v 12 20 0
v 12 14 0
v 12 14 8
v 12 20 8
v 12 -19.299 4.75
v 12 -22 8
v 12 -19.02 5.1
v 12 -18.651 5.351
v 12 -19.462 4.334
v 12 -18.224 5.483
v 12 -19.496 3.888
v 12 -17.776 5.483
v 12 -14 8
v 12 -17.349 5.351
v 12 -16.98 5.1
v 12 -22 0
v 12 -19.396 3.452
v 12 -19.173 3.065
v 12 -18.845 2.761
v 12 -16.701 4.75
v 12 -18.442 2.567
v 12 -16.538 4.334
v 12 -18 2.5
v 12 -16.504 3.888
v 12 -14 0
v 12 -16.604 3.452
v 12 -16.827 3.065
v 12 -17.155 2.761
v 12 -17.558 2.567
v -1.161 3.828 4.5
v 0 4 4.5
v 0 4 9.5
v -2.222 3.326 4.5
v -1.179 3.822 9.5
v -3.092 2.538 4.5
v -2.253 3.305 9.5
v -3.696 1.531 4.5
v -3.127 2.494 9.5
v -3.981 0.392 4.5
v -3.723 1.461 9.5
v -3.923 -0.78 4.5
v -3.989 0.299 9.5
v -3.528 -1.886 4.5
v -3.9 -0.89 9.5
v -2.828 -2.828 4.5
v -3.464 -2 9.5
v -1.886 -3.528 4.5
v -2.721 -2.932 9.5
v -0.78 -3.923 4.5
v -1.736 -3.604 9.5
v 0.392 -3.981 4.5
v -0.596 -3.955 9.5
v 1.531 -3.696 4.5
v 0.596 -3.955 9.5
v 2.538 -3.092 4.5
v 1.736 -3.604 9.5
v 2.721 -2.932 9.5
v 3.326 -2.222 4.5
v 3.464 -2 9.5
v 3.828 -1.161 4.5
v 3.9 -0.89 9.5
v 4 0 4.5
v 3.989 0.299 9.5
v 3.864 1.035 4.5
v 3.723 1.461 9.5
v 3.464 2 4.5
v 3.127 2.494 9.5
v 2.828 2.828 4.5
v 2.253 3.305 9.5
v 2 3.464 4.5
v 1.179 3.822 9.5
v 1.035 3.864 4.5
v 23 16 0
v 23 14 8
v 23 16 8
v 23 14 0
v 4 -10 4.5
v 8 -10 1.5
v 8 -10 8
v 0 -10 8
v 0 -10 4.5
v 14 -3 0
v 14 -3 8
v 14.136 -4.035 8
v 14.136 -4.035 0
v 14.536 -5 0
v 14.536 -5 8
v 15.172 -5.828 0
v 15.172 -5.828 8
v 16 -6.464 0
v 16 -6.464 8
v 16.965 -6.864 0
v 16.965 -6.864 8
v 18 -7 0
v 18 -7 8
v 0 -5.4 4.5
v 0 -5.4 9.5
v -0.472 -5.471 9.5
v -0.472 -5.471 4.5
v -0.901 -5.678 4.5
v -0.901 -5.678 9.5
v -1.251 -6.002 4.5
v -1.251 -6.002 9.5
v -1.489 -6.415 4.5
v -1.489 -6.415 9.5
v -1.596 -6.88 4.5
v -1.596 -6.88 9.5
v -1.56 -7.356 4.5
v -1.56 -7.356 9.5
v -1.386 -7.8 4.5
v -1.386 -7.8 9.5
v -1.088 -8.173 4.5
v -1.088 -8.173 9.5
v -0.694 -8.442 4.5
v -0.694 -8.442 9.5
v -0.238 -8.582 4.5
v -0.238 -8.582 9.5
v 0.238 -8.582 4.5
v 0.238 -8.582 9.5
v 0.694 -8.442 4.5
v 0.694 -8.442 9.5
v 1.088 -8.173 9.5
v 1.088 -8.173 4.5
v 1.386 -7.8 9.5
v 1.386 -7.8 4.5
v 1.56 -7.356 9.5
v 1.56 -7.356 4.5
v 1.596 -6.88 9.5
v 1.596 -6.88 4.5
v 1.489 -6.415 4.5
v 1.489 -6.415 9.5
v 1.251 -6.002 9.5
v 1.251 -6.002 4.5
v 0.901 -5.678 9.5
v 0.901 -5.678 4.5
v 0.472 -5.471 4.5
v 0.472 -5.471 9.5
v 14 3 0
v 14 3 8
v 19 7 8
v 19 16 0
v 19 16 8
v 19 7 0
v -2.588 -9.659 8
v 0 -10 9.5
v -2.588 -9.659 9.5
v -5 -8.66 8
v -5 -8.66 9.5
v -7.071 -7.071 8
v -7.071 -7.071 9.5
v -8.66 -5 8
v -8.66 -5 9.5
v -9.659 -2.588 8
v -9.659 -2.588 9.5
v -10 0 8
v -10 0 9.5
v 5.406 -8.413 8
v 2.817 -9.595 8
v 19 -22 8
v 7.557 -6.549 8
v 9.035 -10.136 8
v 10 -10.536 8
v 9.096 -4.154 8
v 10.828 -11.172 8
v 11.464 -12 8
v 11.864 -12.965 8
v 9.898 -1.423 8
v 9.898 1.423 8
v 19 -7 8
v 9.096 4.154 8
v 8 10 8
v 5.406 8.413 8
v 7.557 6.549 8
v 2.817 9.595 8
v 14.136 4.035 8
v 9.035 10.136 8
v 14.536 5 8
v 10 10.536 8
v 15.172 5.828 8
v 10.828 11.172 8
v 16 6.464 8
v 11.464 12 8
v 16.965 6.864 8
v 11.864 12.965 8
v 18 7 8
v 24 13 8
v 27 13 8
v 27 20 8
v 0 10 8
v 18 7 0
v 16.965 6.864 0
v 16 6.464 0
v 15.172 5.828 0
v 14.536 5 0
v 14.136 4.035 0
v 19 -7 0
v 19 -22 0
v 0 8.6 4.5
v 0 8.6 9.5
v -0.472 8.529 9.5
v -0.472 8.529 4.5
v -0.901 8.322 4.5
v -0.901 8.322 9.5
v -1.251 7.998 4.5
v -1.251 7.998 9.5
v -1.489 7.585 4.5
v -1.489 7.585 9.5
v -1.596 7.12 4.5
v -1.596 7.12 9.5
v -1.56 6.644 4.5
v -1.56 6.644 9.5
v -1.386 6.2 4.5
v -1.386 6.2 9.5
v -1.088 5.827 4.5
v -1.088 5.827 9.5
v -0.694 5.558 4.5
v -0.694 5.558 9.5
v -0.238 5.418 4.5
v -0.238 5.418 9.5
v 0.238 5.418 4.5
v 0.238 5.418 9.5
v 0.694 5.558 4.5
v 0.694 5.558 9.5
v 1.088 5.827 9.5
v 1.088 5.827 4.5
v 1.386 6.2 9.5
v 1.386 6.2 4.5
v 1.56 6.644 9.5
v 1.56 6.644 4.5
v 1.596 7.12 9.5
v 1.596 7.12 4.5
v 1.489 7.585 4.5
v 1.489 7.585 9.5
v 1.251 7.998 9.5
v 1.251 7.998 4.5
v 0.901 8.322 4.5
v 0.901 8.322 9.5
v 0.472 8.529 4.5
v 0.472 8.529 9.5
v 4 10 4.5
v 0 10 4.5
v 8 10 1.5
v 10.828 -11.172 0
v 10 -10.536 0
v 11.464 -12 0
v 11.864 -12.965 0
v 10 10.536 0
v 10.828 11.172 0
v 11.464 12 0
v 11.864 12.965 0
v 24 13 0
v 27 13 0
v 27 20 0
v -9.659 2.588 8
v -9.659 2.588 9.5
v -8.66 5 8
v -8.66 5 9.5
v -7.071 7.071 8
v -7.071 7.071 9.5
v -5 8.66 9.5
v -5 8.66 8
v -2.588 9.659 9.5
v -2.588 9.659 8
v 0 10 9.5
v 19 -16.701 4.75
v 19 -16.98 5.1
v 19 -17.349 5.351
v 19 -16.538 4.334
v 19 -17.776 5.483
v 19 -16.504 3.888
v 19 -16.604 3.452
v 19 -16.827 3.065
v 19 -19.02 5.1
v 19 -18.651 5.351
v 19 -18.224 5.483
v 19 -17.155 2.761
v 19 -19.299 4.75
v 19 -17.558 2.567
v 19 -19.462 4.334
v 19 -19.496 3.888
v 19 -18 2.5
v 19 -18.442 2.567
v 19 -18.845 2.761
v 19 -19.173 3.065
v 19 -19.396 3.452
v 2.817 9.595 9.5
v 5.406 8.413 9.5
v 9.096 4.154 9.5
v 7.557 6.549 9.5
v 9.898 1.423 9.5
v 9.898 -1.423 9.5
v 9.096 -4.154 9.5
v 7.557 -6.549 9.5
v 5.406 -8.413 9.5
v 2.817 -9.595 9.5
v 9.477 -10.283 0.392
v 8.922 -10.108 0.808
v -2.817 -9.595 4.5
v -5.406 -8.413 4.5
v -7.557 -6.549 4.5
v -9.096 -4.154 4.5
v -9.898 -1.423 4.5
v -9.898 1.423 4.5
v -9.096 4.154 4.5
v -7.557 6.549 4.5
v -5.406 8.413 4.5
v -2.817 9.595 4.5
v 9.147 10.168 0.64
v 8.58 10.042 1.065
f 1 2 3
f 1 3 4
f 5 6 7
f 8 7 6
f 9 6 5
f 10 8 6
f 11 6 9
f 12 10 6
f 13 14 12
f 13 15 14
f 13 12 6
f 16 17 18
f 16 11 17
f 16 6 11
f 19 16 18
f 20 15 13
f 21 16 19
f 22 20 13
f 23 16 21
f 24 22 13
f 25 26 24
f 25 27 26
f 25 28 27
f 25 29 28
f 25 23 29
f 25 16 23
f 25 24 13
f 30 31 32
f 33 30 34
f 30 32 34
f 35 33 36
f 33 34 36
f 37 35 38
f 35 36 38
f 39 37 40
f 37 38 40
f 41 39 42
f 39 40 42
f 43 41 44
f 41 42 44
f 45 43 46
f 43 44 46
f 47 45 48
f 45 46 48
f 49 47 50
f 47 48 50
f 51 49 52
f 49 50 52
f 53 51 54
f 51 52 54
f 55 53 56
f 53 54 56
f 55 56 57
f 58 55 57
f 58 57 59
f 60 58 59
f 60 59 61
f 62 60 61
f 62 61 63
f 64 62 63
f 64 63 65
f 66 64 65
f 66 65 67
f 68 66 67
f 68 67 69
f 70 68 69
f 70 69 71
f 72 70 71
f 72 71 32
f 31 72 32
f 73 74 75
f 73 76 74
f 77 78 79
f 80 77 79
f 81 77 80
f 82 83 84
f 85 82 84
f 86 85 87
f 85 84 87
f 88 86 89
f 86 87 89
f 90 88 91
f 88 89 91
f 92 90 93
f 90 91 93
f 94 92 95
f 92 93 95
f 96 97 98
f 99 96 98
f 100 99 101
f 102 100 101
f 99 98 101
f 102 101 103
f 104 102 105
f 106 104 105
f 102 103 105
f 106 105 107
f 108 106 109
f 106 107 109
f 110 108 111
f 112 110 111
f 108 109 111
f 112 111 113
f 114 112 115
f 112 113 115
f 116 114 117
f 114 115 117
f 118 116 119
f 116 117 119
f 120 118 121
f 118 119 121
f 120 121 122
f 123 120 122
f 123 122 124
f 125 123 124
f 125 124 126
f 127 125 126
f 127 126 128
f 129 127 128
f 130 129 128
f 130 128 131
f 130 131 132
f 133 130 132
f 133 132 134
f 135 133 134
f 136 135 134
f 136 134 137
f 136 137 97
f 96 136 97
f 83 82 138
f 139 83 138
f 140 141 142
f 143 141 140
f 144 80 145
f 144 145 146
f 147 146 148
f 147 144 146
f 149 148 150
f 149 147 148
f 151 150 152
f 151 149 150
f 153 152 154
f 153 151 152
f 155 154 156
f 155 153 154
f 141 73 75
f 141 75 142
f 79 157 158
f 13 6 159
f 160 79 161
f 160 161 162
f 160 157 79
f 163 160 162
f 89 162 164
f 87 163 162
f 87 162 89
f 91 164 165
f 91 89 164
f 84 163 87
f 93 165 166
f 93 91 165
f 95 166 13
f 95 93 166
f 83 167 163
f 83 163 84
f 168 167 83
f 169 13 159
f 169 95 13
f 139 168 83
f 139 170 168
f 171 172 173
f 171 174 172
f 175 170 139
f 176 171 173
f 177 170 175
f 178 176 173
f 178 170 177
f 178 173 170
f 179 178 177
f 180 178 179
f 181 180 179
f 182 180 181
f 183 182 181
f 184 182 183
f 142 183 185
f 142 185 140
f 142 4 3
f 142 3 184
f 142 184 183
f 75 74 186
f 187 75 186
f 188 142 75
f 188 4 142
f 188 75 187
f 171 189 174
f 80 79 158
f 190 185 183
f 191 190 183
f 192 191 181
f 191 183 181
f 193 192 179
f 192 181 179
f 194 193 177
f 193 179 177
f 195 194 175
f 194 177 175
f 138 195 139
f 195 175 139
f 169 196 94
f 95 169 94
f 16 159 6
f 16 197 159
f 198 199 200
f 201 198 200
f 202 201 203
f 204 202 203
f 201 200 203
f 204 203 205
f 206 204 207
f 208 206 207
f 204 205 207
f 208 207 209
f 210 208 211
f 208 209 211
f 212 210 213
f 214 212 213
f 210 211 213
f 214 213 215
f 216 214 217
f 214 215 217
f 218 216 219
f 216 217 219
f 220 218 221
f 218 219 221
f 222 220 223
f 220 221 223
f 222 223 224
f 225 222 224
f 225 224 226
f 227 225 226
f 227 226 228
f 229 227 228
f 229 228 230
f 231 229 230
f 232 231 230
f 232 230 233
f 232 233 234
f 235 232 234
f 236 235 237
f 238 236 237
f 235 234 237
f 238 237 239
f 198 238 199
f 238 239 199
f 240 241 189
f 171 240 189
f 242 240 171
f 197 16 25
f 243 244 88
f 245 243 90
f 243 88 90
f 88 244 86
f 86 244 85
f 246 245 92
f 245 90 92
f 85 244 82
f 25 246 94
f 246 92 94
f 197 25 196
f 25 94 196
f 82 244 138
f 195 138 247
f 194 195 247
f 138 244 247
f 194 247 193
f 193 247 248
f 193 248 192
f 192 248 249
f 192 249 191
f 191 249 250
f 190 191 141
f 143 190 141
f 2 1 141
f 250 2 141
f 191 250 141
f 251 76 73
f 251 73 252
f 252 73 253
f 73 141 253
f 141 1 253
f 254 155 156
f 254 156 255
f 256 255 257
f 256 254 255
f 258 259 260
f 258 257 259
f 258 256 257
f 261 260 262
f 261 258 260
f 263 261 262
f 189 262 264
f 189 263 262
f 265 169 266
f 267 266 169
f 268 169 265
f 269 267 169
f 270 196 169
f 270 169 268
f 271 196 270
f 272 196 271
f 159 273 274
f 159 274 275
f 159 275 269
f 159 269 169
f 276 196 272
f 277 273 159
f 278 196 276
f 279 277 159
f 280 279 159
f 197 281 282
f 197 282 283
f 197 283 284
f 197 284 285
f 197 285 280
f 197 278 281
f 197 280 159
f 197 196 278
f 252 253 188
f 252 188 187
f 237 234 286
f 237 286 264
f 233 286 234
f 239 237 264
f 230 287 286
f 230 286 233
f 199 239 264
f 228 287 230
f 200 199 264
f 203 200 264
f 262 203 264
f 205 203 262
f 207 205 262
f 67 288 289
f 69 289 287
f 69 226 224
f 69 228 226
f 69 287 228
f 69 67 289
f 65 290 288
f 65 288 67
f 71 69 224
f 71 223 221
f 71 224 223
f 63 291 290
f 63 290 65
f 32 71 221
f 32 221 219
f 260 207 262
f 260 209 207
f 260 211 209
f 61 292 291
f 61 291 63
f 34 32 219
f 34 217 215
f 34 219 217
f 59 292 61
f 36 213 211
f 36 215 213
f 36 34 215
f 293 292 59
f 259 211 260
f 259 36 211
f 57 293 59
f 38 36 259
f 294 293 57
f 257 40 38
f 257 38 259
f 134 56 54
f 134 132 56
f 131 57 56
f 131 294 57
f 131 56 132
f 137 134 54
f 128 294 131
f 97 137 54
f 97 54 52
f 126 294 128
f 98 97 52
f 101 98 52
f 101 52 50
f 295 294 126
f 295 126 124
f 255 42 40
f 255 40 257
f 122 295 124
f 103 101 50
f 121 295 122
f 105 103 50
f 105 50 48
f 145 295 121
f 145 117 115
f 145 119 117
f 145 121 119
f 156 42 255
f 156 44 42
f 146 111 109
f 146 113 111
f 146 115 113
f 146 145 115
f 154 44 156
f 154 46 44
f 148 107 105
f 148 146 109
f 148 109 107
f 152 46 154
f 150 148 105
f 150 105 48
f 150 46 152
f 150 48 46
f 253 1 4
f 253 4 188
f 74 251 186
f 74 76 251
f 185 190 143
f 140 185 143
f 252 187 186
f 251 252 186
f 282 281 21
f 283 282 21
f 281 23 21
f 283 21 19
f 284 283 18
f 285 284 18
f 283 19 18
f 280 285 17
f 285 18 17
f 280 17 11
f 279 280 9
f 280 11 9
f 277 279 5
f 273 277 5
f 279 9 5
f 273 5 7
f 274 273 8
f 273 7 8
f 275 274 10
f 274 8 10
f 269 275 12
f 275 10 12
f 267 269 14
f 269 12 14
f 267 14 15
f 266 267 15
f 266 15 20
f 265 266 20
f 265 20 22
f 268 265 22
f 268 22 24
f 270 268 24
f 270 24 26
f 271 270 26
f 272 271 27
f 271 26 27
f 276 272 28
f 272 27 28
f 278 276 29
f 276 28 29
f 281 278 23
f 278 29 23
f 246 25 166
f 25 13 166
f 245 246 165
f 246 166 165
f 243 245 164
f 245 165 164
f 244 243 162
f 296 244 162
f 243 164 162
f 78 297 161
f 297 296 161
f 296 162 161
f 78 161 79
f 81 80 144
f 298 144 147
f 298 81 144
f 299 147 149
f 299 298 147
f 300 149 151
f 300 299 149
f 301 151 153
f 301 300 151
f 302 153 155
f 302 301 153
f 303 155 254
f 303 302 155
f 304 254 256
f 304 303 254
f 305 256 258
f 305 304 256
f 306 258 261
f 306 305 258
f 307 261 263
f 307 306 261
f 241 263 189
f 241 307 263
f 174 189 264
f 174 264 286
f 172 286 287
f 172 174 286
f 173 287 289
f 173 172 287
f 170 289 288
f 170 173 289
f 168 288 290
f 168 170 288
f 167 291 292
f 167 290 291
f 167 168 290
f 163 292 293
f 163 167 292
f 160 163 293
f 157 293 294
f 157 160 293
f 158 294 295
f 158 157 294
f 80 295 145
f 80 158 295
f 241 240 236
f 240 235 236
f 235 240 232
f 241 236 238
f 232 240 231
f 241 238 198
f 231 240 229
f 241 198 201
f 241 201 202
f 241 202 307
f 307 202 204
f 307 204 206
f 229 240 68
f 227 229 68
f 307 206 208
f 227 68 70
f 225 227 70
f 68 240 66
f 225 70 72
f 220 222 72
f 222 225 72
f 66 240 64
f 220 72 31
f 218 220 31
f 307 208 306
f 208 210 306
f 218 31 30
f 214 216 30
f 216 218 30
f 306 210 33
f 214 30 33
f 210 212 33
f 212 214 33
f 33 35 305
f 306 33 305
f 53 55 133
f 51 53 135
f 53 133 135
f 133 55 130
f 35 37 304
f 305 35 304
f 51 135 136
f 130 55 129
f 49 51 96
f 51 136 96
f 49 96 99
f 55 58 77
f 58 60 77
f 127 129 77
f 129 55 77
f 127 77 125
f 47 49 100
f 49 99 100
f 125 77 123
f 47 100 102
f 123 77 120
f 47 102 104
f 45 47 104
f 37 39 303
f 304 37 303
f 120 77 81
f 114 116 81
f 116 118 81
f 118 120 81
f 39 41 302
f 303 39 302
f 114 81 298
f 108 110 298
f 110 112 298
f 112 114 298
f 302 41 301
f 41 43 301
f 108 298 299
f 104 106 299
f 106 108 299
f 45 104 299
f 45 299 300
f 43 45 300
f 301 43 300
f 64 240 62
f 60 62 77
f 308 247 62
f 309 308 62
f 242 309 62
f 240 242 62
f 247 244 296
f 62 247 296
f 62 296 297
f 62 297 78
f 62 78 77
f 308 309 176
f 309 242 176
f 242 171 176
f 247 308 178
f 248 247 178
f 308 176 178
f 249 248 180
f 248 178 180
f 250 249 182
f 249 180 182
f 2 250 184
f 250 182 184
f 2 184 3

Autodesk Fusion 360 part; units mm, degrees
sketch "スケッチ1" plane through (0, 0, 0) normal (0, 0, 1) x (1, 0, 0)
  circle A0 centre (0, 0) radius 10
  line L0 (0, 10) -> (12, 10)
  line L1 (12, 10) -> (12, 20)
  line L2 (12, 20) -> (27, 20)
  line L3 (27, 20) -> (27, 13)
  line L4 (27, 13) -> (23, 13)
  line L5 (23, 13) -> (23, 16)
  line L6 (23, 16) -> (19, 16)
  line L7 (19, 16) -> (19, -22)
  line L8 (19, -22) -> (12, -22)
  line L9 (12, -22) -> (12, -10)
  line L10 (12, -10) -> (0, -10)
  line L11 (0, -7) -> (0, 7)
  line L12 (19, -7) -> (14, -7)
  line L13 (14, -7) -> (14, 7)
  line L14 (14, 7) -> (19, 7)
  point P0 (14, 0)
  dimension "d1" = 20
  dimension "d2" = 12
  dimension "d4" = 4
  dimension "d5" = 4
  dimension "d6" = 7
  dimension "d8" = 4
  dimension "d9" = 3
  dimension "d19" = 14
  dimension "d29" = 13
  dimension "d30" = 22
  dimension "d31" = 5
  dimension "d32" = 14
extrude "押し出し1" add sketch "スケッチ1" along normal blind 8 contours A0 | A0 L0 L1 L2 L3 L4 L5 L6 L7 L8 L9 L10 L12 L13 L14
sketch "スケッチ2" plane through (0, 0, 8) normal (0, 0, 1) x (-1, 0, 0)
  arc A0 (0, -10) -> (0, 10) centre (0, 0) ccw
  line L0 (0, 10) -> (-12, 10)
  line L1 (-12, 10) -> (-12, 22)
  line L2 (-12, 22) -> (-19, 22)
  line L3 (-19, -7) -> (-19, -16)
  line L4 (-19, -16) -> (-23, -16)
  line L5 (-23, -16) -> (-23, -13)
  line L6 (-23, -13) -> (-27, -13)
  line L7 (-27, -13) -> (-27, -20)
  line L8 (-27, -20) -> (-12, -20)
  line L9 (-12, -20) -> (-12, -10)
  line L10 (-12, -10) -> (0, -10)
  circle A1 centre (0, 0) radius 10
  line L11 (-19, 7) -> (-14, 7)
  line L12 (-14, 7) -> (-14, -7)
  line L13 (-14, -7) -> (-19, -7)
  line L14 (-19, 22) -> (-19, 7)
extrude "押し出し2" add sketch "スケッチ2" along normal blind 1.5 contours A0 A1
hole "穴1" at (0, 7, 0) at (0, -7, 0) direction (0, 0, 1) diameter 3.2 end through all
hole "穴3" at (0, 0, 0) direction (0, 0, 1) diameter 8 end through all
sketch "スケッチ3" plane through (0, -10, 0) normal (0, -1, 0) x (1, 0, 0)
  line L0 (0, 0) -> (12, 0)
  line L1 (12, 0) -> (12, 8)
  line L2 (12, 8) -> (0, 8)
  line L3 (0, 8) -> (0, 0)
  line L4 (10, 0) -> (4, 4.5)
  line L5 (4, 4.5) -> (-15, 4.5)
  line L6 (-15, 4.5) -> (-15, 0)
  line L7 (-15, 0) -> (10, 0)
  dimension "d20" = 10
  dimension "d21" = 15
  dimension "d22" = 6
  dimension "d23" = 4.5
extrude "押し出し3" cut sketch "スケッチ3" against normal through all contours L0 L3 L4 L5 L7 | L3 L5 L6 L7
sketch "スケッチ4" plane through (19, 0, 0) normal (1, 0, 0) x (0, 1, 0)
  line L0 (-22, 0) -> (-7, 0)
  line L1 (16, 0) -> (16, 8)
  line L2 (-7, 8) -> (-22, 8)
  line L3 (-22, 8) -> (-22, 0)
  line L4 (-22, 4) -> (-18, 4)
  line L5 (-7, 0) -> (-7, 8)
  line L6 (7, 0) -> (16, 0)
  line L7 (16, 8) -> (7, 8)
  line L8 (7, 8) -> (7, 0)
  dimension "d25" = 4
hole "穴2" at (19, -18, 4) direction (-1, 0, 0) diameter 3 depth 11 tip angle 118
thread "ねじ1"
chamfer "面取り1" distance 1 angle 45 1 edges at (23, 13, 4)
fillet "フィレット1" radius 4 4 edges at (12, 10, 4) (12, -10, 4) (14, -7, 4) (14, 7, 4)
